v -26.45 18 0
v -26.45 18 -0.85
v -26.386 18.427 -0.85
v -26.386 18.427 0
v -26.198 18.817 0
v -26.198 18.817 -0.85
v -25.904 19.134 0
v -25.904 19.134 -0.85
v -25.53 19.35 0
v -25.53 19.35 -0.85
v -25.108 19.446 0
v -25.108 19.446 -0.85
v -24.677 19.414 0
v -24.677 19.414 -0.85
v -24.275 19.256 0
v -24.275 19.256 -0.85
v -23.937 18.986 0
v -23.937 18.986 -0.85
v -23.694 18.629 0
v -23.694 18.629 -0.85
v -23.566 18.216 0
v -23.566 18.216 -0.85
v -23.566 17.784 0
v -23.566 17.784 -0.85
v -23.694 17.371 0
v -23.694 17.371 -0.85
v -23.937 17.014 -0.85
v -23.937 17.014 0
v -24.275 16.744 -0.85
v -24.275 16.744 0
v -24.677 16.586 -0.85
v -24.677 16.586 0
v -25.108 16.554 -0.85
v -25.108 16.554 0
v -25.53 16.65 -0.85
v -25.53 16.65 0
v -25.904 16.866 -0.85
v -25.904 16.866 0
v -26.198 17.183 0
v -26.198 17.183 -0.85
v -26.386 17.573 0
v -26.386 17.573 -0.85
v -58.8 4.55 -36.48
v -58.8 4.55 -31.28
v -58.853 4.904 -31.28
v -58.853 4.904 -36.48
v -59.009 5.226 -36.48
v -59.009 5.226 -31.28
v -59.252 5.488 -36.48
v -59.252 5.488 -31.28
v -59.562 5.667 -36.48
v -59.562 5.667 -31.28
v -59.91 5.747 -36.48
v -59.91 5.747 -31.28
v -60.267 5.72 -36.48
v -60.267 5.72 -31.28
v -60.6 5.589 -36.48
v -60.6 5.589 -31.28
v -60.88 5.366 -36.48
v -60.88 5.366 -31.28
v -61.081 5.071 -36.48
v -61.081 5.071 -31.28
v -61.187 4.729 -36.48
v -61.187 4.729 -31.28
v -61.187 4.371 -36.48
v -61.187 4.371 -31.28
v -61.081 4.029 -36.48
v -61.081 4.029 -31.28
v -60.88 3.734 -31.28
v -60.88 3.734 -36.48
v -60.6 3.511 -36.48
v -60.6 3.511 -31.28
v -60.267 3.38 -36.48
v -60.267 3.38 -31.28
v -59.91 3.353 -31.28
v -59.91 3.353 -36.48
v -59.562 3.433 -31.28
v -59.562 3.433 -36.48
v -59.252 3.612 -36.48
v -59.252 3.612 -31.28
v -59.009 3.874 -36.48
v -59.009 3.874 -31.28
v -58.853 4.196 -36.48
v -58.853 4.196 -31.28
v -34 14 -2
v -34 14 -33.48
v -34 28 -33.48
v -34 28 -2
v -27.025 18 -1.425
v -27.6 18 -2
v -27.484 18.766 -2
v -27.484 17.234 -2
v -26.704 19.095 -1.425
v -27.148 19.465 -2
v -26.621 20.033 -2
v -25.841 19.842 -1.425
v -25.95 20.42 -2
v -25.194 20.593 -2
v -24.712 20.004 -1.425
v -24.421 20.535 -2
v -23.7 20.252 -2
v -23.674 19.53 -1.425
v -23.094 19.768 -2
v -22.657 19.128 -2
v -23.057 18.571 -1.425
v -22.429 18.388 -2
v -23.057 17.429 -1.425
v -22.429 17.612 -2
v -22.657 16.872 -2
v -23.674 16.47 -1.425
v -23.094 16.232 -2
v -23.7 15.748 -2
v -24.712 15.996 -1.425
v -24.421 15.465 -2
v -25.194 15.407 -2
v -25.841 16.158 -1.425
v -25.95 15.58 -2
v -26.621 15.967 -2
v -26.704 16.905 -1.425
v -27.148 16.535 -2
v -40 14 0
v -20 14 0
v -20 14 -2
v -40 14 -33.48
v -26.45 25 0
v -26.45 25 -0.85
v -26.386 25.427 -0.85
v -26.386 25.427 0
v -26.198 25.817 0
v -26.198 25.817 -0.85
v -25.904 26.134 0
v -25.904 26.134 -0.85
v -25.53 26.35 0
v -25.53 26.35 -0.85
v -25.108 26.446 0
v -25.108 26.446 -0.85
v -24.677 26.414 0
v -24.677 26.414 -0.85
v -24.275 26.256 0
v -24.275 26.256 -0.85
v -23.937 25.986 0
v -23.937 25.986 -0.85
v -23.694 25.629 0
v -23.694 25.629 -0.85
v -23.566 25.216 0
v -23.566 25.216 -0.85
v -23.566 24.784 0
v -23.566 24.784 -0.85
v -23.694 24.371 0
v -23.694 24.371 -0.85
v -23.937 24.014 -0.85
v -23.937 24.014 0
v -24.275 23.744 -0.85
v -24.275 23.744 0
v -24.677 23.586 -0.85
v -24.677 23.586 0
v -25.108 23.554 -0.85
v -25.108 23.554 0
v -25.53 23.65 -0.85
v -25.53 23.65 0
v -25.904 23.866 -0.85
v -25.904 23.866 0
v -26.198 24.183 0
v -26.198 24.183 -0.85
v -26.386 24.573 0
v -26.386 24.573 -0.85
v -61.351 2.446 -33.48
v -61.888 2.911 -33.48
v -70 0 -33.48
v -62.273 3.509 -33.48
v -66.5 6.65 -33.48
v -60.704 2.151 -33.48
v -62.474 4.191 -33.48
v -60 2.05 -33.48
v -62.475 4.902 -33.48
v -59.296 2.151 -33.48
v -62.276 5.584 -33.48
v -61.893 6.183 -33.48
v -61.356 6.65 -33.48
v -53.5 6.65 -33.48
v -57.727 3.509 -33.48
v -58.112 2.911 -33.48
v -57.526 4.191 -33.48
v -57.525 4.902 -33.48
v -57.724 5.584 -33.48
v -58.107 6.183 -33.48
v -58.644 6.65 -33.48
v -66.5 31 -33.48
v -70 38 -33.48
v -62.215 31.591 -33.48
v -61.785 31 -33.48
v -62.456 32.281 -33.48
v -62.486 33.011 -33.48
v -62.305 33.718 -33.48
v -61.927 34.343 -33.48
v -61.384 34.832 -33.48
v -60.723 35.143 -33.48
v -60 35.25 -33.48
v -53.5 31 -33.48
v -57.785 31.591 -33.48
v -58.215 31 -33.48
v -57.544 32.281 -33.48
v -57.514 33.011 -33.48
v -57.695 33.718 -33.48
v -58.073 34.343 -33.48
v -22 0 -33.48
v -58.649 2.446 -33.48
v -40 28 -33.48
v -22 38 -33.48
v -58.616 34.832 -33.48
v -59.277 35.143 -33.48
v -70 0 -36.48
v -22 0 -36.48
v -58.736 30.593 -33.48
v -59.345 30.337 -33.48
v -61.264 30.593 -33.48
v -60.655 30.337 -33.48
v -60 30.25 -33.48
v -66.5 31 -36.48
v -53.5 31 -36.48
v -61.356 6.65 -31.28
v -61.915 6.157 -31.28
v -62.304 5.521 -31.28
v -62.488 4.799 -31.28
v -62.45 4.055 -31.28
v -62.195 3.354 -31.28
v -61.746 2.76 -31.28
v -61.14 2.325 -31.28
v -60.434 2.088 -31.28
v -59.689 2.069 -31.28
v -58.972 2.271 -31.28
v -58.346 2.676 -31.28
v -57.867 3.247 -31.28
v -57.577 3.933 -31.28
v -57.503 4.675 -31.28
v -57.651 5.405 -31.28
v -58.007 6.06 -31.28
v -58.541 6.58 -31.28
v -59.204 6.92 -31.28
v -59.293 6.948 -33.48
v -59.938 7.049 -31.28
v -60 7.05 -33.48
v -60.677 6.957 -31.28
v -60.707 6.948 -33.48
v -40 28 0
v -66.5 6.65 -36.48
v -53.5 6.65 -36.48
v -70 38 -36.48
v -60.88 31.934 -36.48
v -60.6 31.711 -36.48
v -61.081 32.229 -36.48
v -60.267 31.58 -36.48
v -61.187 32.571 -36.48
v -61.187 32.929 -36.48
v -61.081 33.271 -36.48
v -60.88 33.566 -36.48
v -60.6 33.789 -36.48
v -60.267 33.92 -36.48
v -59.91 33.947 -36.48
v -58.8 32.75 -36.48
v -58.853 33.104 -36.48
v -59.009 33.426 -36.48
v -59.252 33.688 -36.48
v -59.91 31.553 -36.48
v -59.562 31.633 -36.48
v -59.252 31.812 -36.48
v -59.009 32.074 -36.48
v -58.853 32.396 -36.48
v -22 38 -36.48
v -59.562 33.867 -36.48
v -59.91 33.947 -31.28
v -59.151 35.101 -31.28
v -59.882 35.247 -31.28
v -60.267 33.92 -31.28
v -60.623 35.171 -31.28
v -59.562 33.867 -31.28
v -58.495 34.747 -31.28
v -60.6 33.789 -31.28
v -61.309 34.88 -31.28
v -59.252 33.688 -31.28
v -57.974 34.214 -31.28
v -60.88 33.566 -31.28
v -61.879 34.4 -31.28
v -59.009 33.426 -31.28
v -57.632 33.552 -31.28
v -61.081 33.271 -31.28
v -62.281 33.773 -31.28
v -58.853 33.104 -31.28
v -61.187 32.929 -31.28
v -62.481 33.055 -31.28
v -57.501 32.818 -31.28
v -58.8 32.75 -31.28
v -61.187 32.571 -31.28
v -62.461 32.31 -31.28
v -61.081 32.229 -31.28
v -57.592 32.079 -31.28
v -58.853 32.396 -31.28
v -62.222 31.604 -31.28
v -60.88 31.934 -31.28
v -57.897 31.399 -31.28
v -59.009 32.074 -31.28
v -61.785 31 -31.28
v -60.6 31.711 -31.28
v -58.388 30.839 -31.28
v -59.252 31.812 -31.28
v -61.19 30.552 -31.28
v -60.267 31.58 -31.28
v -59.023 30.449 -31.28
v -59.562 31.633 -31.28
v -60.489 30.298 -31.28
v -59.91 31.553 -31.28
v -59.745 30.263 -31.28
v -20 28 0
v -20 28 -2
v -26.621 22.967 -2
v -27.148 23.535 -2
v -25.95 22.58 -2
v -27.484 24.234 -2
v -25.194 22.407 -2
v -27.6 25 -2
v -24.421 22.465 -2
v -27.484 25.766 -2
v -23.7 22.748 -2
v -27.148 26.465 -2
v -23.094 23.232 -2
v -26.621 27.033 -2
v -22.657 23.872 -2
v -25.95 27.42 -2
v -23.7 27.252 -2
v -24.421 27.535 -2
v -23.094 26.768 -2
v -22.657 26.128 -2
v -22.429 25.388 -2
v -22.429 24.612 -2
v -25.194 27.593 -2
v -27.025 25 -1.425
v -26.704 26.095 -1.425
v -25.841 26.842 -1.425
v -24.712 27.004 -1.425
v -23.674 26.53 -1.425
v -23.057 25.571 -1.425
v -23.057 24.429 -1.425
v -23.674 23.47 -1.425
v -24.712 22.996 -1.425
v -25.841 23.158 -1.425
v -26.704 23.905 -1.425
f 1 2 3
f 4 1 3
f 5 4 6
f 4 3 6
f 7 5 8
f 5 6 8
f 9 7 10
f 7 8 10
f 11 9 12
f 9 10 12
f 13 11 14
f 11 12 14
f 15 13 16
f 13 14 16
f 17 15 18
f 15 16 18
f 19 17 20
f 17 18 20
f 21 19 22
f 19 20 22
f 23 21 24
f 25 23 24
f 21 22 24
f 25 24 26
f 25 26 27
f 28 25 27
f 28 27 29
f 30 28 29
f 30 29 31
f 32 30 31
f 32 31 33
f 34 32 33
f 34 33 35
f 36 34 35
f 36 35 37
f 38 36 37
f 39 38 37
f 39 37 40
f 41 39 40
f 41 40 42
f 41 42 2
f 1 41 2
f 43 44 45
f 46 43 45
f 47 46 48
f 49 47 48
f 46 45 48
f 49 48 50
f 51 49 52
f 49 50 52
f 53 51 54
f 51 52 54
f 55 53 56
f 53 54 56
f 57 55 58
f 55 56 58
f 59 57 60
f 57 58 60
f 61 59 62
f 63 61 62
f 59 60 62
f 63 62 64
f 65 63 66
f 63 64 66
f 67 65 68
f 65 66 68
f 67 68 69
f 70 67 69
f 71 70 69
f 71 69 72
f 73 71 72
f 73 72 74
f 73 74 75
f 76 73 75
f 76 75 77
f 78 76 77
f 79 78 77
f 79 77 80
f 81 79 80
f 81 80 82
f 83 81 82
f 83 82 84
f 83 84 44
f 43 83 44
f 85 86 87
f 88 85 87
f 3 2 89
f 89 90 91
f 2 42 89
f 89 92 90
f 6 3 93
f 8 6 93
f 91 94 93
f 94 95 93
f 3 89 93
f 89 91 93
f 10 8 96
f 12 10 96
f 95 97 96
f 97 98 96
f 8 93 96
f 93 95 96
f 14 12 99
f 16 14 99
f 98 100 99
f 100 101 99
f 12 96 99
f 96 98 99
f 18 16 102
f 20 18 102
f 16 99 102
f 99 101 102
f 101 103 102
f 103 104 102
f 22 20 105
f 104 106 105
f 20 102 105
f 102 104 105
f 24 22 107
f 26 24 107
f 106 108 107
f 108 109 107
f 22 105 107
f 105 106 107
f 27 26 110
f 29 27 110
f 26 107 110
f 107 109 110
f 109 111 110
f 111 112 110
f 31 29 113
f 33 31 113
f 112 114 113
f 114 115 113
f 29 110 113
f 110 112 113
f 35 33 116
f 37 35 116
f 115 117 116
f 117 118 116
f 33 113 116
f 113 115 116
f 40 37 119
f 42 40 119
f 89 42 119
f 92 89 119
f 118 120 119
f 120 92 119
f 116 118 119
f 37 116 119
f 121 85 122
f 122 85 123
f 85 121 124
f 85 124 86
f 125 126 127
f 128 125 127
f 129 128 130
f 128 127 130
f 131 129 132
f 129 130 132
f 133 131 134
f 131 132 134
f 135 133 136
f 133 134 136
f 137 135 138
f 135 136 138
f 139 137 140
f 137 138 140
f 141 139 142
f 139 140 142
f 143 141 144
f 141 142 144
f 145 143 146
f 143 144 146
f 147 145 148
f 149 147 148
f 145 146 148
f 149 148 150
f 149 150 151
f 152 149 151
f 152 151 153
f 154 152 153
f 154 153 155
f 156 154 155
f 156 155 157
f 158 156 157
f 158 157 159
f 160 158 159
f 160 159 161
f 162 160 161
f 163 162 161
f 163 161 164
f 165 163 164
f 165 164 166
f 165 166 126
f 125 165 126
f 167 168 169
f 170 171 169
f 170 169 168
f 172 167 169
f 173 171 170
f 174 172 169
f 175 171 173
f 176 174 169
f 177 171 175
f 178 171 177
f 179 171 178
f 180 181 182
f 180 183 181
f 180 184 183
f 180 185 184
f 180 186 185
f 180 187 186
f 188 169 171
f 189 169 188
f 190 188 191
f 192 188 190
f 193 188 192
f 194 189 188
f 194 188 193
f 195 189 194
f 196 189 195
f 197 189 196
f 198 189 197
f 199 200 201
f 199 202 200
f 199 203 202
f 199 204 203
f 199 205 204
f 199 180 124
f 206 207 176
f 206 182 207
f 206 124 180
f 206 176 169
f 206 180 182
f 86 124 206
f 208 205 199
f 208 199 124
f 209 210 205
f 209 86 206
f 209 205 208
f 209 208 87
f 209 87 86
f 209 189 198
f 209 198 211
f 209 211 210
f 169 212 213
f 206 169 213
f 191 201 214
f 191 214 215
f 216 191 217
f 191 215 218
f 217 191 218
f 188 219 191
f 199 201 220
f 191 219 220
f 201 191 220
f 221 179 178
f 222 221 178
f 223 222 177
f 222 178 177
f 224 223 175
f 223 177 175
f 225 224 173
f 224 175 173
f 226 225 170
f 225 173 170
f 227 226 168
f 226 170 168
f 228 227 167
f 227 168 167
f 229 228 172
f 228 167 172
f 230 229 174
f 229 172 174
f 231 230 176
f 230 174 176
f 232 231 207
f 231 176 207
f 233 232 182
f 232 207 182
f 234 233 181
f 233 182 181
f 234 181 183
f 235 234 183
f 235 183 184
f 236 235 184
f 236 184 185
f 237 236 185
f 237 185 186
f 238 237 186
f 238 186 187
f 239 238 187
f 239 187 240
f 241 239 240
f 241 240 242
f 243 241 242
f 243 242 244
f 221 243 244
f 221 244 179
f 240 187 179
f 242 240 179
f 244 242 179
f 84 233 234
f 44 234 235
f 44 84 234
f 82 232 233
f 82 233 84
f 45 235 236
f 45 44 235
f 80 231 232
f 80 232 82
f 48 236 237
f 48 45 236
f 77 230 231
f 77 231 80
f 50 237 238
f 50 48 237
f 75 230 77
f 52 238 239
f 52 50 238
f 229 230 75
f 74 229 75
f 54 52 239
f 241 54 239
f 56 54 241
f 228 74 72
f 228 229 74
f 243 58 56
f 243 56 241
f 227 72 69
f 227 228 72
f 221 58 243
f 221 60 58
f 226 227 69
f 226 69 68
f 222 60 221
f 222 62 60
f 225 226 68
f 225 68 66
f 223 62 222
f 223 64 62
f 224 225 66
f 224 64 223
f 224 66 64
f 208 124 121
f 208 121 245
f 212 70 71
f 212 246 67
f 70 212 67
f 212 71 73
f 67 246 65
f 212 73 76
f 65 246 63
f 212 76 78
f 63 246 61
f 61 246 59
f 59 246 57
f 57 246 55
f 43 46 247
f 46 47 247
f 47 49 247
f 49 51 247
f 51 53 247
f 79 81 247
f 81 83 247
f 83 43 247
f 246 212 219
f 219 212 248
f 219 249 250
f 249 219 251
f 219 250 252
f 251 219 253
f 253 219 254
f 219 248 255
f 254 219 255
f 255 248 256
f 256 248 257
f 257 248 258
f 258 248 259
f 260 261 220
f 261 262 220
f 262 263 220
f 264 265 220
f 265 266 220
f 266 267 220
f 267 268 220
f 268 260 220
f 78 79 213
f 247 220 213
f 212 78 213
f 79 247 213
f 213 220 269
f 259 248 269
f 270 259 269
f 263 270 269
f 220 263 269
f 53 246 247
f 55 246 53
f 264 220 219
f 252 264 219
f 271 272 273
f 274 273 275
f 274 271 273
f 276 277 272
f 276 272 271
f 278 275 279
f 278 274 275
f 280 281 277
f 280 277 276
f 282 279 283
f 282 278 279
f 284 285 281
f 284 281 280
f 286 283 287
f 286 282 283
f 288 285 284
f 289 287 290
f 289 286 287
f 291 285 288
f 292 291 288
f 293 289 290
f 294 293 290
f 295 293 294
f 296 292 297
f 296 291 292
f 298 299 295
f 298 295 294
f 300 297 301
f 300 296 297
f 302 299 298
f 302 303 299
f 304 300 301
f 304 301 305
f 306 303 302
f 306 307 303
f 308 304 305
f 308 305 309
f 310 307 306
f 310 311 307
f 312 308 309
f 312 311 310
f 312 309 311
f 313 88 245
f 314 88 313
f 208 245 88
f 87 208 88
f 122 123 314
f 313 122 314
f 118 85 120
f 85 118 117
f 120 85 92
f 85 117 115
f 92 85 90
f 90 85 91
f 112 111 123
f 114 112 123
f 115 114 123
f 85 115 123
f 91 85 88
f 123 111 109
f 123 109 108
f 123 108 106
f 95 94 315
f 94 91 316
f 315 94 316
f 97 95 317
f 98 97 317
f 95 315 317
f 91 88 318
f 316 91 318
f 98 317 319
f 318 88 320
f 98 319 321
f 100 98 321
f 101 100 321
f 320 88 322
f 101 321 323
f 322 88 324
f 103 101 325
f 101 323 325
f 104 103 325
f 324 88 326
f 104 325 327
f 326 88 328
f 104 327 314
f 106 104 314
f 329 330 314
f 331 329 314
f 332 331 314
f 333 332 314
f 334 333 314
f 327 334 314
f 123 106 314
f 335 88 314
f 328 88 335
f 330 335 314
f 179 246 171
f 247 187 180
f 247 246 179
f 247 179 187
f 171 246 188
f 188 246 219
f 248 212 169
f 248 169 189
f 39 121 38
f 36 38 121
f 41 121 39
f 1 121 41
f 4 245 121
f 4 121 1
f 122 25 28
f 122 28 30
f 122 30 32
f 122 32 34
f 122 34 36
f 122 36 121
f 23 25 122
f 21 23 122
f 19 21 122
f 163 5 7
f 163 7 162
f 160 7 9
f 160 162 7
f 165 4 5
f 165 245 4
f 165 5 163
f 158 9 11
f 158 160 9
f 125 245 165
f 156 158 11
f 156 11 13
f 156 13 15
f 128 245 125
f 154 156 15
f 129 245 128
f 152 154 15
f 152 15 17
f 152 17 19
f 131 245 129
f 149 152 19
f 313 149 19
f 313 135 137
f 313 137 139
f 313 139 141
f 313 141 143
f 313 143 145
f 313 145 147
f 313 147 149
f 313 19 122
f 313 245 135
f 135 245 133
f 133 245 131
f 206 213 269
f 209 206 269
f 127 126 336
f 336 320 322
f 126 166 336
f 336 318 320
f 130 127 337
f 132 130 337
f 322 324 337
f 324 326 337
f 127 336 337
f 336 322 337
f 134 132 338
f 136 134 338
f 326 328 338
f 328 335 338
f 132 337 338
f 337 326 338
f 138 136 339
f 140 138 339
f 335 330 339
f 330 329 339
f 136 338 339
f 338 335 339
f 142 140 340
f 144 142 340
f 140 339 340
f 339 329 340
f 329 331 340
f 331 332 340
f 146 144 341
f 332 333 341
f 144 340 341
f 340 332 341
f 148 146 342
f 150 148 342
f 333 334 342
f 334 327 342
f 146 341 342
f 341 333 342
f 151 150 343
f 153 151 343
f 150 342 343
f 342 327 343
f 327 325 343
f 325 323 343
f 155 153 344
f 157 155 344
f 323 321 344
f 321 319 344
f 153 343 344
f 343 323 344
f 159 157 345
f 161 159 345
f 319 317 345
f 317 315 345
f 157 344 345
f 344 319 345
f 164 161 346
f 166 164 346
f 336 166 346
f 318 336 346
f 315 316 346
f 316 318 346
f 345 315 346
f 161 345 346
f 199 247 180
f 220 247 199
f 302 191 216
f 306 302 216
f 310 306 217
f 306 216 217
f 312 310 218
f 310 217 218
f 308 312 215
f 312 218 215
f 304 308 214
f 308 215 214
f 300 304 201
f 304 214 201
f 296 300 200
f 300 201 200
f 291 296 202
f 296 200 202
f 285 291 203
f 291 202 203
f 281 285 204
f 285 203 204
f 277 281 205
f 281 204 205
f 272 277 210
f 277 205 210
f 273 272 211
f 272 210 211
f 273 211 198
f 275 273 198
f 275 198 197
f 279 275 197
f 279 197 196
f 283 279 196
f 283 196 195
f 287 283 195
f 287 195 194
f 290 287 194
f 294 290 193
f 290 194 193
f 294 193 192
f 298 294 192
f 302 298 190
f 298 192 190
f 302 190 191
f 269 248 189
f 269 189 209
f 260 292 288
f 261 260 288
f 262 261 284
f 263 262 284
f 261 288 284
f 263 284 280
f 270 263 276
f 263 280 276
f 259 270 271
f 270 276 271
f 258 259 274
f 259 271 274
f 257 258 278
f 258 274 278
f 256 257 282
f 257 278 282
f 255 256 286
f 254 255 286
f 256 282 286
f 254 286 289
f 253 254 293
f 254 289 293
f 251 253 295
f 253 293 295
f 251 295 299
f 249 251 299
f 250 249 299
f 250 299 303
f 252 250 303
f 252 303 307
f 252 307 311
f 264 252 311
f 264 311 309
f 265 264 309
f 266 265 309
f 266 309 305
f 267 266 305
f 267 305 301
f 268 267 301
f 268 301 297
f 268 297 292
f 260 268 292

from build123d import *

# Parameters (mm, degrees)
SERVO_SHELF_START                        = -36.480025
SKETCH1_W                                = 48
SKETCH1_H                                = 38
SKETCH1_W_2                              = 13
SKETCH1_H_2                              = 24.35
SERVO_SHELF_DEPTH                        = 3
OUTBOARD_RISER_START                     = -34.480025
SKETCH2_W                                = 6
SKETCH2_H                                = 14
OUTBOARD_RISER_DEPTH                     = 33.480025
PLATE_ATTACHMENT_FOOT_START              = -2
SKETCH3_W                                = 20
SKETCH3_H                                = 14
PLATE_ATTACHMENT_FOOT_DEPTH              = 2
SKETCH4_R                                = 1.45
SERVO_PAD_D2P9_DEPTH                     = 2.01
SKETCH5_R                                = 2.6
SERVO_PAD_CSK_D5P2_90DEG_DEPTH           = 1.15
SERVO_PAD_CSK_D5P2_90DEG_DRAFT           = -45
SERVO_PAD_CSK_D5P2_90DEG_PROFILE_2_DEPTH = 1.15
SERVO_PAD_CSK_D5P2_90DEG_PROFILE_2_DRAFT = -45
SERVO_EAR_SUPPORTS_H2P2_START            = -33.480025
SKETCH6_R                                = 2.5
SERVO_EAR_SUPPORTS_H2P2_DEPTH            = 2.2
SKETCH7_R                                = 1.2
SERVO_EAR_D2P4_THROUGH_DEPTH             = 5.21


with BuildPart() as part:
    # Sketch1 → Servo_Shelf (new body)
    with BuildSketch(Plane.XY.offset(SERVO_SHELF_START)):
        with Locations((-46, 19)):
            Rectangle(SKETCH1_W, SKETCH1_H)
        with Locations((-60, 18.825)):
            Rectangle(SKETCH1_W_2, SKETCH1_H_2, mode=Mode.SUBTRACT)
    extrude(amount=SERVO_SHELF_DEPTH)

    # Sketch2 → Outboard_Riser (add)
    with BuildSketch(Plane.XY.offset(OUTBOARD_RISER_START)):
        with Locations((-37, 21)):
            Rectangle(SKETCH2_W, SKETCH2_H)
    extrude(amount=OUTBOARD_RISER_DEPTH)

    # Sketch3 → Plate_Attachment_Foot (add)
    with BuildSketch(Plane.XY.offset(PLATE_ATTACHMENT_FOOT_START)):
        with Locations((-30, 21)):
            Rectangle(SKETCH3_W, SKETCH3_H)
    extrude(amount=PLATE_ATTACHMENT_FOOT_DEPTH)

    # Sketch4 → Servo_Pad_D2p9 (cut)
    with BuildSketch(Plane(origin=(0, 0, -2), x_dir=(-1, 0, 0), z_dir=(0, 0, -1))):
        with Locations((25, 18)):
            Circle(SKETCH4_R)
        with Locations((25, 25)):
            Circle(SKETCH4_R)
    extrude(amount=-SERVO_PAD_D2P9_DEPTH, mode=Mode.SUBTRACT)


with BuildPart() as servo_pad_csk_d5p2_90deg_tool:
    # Sketch5 → Servo_Pad_CSK_D5p2_90deg (with draft: the straight prism first)
    with BuildSketch(Plane(origin=(0, 0, -2), x_dir=(-1, 0, 0), z_dir=(0, 0, -1))):
        with Locations((25, 18)):
            Circle(SKETCH5_R)
    extrude(amount=-SERVO_PAD_CSK_D5P2_90DEG_DEPTH)
    # Servo_Pad_CSK_D5p2_90deg: the draft: its side faces are tilted about the plane it starts from
    servo_pad_csk_d5p2_90deg_sides = [servo_pad_csk_d5p2_90deg_tool.faces().sort_by_distance(p)[0] for p in [
        (-22.4, 18, -1.425),
    ]]
    draft(servo_pad_csk_d5p2_90deg_sides, Plane(origin=(0, 0, -2), x_dir=(-1, 0, 0), z_dir=(0, 0, -1)), SERVO_PAD_CSK_D5P2_90DEG_DRAFT)


with BuildPart() as part_1:
    add(part.part)

    # Servo_Pad_CSK_D5p2_90deg: cut by servo_pad_csk_d5p2_90deg_tool
    add(servo_pad_csk_d5p2_90deg_tool.part, mode=Mode.SUBTRACT)


with BuildPart() as servo_pad_csk_d5p2_90deg_profile_2_tool:
    # Sketch5 → Servo_Pad_CSK_D5p2_90deg profile 2 (with draft: the straight prism first)
    with BuildSketch(Plane(origin=(0, 0, -2), x_dir=(-1, 0, 0), z_dir=(0, 0, -1))):
        with Locations((25, 25)):
            Circle(SKETCH5_R)
    extrude(amount=-SERVO_PAD_CSK_D5P2_90DEG_PROFILE_2_DEPTH)
    # Servo_Pad_CSK_D5p2_90deg profile 2: the draft: its side faces are tilted about the plane it starts from
    servo_pad_csk_d5p2_90deg_profile_2_sides = [servo_pad_csk_d5p2_90deg_profile_2_tool.faces().sort_by_distance(p)[0] for p in [
        (-22.4, 25, -1.425),
    ]]
    draft(servo_pad_csk_d5p2_90deg_profile_2_sides, Plane(origin=(0, 0, -2), x_dir=(-1, 0, 0), z_dir=(0, 0, -1)), SERVO_PAD_CSK_D5P2_90DEG_PROFILE_2_DRAFT)


with BuildPart() as part_2:
    add(part_1.part)

    # Servo_Pad_CSK_D5p2_90deg profile 2: cut by servo_pad_csk_d5p2_90deg_profile_2_tool
    add(servo_pad_csk_d5p2_90deg_profile_2_tool.part, mode=Mode.SUBTRACT)

    # Sketch6 → Servo_Ear_Supports_H2p2 (add)
    with BuildSketch(Plane.XY.offset(SERVO_EAR_SUPPORTS_H2P2_START)):
        with Locations((-60, 4.55)):
            Circle(SKETCH6_R)
        with Locations((-60, 32.75)):
            Circle(SKETCH6_R)
    extrude(amount=SERVO_EAR_SUPPORTS_H2P2_DEPTH)

    # Sketch7 → Servo_Ear_D2p4_Through (cut)
    with BuildSketch(Plane.XY.offset(-31.280025)):
        with Locations((-60, 4.55)):
            Circle(SKETCH7_R)
        with Locations((-60, 32.75)):
            Circle(SKETCH7_R)
    extrude(amount=-SERVO_EAR_D2P4_THROUGH_DEPTH, mode=Mode.SUBTRACT)


solid = part_2.part
